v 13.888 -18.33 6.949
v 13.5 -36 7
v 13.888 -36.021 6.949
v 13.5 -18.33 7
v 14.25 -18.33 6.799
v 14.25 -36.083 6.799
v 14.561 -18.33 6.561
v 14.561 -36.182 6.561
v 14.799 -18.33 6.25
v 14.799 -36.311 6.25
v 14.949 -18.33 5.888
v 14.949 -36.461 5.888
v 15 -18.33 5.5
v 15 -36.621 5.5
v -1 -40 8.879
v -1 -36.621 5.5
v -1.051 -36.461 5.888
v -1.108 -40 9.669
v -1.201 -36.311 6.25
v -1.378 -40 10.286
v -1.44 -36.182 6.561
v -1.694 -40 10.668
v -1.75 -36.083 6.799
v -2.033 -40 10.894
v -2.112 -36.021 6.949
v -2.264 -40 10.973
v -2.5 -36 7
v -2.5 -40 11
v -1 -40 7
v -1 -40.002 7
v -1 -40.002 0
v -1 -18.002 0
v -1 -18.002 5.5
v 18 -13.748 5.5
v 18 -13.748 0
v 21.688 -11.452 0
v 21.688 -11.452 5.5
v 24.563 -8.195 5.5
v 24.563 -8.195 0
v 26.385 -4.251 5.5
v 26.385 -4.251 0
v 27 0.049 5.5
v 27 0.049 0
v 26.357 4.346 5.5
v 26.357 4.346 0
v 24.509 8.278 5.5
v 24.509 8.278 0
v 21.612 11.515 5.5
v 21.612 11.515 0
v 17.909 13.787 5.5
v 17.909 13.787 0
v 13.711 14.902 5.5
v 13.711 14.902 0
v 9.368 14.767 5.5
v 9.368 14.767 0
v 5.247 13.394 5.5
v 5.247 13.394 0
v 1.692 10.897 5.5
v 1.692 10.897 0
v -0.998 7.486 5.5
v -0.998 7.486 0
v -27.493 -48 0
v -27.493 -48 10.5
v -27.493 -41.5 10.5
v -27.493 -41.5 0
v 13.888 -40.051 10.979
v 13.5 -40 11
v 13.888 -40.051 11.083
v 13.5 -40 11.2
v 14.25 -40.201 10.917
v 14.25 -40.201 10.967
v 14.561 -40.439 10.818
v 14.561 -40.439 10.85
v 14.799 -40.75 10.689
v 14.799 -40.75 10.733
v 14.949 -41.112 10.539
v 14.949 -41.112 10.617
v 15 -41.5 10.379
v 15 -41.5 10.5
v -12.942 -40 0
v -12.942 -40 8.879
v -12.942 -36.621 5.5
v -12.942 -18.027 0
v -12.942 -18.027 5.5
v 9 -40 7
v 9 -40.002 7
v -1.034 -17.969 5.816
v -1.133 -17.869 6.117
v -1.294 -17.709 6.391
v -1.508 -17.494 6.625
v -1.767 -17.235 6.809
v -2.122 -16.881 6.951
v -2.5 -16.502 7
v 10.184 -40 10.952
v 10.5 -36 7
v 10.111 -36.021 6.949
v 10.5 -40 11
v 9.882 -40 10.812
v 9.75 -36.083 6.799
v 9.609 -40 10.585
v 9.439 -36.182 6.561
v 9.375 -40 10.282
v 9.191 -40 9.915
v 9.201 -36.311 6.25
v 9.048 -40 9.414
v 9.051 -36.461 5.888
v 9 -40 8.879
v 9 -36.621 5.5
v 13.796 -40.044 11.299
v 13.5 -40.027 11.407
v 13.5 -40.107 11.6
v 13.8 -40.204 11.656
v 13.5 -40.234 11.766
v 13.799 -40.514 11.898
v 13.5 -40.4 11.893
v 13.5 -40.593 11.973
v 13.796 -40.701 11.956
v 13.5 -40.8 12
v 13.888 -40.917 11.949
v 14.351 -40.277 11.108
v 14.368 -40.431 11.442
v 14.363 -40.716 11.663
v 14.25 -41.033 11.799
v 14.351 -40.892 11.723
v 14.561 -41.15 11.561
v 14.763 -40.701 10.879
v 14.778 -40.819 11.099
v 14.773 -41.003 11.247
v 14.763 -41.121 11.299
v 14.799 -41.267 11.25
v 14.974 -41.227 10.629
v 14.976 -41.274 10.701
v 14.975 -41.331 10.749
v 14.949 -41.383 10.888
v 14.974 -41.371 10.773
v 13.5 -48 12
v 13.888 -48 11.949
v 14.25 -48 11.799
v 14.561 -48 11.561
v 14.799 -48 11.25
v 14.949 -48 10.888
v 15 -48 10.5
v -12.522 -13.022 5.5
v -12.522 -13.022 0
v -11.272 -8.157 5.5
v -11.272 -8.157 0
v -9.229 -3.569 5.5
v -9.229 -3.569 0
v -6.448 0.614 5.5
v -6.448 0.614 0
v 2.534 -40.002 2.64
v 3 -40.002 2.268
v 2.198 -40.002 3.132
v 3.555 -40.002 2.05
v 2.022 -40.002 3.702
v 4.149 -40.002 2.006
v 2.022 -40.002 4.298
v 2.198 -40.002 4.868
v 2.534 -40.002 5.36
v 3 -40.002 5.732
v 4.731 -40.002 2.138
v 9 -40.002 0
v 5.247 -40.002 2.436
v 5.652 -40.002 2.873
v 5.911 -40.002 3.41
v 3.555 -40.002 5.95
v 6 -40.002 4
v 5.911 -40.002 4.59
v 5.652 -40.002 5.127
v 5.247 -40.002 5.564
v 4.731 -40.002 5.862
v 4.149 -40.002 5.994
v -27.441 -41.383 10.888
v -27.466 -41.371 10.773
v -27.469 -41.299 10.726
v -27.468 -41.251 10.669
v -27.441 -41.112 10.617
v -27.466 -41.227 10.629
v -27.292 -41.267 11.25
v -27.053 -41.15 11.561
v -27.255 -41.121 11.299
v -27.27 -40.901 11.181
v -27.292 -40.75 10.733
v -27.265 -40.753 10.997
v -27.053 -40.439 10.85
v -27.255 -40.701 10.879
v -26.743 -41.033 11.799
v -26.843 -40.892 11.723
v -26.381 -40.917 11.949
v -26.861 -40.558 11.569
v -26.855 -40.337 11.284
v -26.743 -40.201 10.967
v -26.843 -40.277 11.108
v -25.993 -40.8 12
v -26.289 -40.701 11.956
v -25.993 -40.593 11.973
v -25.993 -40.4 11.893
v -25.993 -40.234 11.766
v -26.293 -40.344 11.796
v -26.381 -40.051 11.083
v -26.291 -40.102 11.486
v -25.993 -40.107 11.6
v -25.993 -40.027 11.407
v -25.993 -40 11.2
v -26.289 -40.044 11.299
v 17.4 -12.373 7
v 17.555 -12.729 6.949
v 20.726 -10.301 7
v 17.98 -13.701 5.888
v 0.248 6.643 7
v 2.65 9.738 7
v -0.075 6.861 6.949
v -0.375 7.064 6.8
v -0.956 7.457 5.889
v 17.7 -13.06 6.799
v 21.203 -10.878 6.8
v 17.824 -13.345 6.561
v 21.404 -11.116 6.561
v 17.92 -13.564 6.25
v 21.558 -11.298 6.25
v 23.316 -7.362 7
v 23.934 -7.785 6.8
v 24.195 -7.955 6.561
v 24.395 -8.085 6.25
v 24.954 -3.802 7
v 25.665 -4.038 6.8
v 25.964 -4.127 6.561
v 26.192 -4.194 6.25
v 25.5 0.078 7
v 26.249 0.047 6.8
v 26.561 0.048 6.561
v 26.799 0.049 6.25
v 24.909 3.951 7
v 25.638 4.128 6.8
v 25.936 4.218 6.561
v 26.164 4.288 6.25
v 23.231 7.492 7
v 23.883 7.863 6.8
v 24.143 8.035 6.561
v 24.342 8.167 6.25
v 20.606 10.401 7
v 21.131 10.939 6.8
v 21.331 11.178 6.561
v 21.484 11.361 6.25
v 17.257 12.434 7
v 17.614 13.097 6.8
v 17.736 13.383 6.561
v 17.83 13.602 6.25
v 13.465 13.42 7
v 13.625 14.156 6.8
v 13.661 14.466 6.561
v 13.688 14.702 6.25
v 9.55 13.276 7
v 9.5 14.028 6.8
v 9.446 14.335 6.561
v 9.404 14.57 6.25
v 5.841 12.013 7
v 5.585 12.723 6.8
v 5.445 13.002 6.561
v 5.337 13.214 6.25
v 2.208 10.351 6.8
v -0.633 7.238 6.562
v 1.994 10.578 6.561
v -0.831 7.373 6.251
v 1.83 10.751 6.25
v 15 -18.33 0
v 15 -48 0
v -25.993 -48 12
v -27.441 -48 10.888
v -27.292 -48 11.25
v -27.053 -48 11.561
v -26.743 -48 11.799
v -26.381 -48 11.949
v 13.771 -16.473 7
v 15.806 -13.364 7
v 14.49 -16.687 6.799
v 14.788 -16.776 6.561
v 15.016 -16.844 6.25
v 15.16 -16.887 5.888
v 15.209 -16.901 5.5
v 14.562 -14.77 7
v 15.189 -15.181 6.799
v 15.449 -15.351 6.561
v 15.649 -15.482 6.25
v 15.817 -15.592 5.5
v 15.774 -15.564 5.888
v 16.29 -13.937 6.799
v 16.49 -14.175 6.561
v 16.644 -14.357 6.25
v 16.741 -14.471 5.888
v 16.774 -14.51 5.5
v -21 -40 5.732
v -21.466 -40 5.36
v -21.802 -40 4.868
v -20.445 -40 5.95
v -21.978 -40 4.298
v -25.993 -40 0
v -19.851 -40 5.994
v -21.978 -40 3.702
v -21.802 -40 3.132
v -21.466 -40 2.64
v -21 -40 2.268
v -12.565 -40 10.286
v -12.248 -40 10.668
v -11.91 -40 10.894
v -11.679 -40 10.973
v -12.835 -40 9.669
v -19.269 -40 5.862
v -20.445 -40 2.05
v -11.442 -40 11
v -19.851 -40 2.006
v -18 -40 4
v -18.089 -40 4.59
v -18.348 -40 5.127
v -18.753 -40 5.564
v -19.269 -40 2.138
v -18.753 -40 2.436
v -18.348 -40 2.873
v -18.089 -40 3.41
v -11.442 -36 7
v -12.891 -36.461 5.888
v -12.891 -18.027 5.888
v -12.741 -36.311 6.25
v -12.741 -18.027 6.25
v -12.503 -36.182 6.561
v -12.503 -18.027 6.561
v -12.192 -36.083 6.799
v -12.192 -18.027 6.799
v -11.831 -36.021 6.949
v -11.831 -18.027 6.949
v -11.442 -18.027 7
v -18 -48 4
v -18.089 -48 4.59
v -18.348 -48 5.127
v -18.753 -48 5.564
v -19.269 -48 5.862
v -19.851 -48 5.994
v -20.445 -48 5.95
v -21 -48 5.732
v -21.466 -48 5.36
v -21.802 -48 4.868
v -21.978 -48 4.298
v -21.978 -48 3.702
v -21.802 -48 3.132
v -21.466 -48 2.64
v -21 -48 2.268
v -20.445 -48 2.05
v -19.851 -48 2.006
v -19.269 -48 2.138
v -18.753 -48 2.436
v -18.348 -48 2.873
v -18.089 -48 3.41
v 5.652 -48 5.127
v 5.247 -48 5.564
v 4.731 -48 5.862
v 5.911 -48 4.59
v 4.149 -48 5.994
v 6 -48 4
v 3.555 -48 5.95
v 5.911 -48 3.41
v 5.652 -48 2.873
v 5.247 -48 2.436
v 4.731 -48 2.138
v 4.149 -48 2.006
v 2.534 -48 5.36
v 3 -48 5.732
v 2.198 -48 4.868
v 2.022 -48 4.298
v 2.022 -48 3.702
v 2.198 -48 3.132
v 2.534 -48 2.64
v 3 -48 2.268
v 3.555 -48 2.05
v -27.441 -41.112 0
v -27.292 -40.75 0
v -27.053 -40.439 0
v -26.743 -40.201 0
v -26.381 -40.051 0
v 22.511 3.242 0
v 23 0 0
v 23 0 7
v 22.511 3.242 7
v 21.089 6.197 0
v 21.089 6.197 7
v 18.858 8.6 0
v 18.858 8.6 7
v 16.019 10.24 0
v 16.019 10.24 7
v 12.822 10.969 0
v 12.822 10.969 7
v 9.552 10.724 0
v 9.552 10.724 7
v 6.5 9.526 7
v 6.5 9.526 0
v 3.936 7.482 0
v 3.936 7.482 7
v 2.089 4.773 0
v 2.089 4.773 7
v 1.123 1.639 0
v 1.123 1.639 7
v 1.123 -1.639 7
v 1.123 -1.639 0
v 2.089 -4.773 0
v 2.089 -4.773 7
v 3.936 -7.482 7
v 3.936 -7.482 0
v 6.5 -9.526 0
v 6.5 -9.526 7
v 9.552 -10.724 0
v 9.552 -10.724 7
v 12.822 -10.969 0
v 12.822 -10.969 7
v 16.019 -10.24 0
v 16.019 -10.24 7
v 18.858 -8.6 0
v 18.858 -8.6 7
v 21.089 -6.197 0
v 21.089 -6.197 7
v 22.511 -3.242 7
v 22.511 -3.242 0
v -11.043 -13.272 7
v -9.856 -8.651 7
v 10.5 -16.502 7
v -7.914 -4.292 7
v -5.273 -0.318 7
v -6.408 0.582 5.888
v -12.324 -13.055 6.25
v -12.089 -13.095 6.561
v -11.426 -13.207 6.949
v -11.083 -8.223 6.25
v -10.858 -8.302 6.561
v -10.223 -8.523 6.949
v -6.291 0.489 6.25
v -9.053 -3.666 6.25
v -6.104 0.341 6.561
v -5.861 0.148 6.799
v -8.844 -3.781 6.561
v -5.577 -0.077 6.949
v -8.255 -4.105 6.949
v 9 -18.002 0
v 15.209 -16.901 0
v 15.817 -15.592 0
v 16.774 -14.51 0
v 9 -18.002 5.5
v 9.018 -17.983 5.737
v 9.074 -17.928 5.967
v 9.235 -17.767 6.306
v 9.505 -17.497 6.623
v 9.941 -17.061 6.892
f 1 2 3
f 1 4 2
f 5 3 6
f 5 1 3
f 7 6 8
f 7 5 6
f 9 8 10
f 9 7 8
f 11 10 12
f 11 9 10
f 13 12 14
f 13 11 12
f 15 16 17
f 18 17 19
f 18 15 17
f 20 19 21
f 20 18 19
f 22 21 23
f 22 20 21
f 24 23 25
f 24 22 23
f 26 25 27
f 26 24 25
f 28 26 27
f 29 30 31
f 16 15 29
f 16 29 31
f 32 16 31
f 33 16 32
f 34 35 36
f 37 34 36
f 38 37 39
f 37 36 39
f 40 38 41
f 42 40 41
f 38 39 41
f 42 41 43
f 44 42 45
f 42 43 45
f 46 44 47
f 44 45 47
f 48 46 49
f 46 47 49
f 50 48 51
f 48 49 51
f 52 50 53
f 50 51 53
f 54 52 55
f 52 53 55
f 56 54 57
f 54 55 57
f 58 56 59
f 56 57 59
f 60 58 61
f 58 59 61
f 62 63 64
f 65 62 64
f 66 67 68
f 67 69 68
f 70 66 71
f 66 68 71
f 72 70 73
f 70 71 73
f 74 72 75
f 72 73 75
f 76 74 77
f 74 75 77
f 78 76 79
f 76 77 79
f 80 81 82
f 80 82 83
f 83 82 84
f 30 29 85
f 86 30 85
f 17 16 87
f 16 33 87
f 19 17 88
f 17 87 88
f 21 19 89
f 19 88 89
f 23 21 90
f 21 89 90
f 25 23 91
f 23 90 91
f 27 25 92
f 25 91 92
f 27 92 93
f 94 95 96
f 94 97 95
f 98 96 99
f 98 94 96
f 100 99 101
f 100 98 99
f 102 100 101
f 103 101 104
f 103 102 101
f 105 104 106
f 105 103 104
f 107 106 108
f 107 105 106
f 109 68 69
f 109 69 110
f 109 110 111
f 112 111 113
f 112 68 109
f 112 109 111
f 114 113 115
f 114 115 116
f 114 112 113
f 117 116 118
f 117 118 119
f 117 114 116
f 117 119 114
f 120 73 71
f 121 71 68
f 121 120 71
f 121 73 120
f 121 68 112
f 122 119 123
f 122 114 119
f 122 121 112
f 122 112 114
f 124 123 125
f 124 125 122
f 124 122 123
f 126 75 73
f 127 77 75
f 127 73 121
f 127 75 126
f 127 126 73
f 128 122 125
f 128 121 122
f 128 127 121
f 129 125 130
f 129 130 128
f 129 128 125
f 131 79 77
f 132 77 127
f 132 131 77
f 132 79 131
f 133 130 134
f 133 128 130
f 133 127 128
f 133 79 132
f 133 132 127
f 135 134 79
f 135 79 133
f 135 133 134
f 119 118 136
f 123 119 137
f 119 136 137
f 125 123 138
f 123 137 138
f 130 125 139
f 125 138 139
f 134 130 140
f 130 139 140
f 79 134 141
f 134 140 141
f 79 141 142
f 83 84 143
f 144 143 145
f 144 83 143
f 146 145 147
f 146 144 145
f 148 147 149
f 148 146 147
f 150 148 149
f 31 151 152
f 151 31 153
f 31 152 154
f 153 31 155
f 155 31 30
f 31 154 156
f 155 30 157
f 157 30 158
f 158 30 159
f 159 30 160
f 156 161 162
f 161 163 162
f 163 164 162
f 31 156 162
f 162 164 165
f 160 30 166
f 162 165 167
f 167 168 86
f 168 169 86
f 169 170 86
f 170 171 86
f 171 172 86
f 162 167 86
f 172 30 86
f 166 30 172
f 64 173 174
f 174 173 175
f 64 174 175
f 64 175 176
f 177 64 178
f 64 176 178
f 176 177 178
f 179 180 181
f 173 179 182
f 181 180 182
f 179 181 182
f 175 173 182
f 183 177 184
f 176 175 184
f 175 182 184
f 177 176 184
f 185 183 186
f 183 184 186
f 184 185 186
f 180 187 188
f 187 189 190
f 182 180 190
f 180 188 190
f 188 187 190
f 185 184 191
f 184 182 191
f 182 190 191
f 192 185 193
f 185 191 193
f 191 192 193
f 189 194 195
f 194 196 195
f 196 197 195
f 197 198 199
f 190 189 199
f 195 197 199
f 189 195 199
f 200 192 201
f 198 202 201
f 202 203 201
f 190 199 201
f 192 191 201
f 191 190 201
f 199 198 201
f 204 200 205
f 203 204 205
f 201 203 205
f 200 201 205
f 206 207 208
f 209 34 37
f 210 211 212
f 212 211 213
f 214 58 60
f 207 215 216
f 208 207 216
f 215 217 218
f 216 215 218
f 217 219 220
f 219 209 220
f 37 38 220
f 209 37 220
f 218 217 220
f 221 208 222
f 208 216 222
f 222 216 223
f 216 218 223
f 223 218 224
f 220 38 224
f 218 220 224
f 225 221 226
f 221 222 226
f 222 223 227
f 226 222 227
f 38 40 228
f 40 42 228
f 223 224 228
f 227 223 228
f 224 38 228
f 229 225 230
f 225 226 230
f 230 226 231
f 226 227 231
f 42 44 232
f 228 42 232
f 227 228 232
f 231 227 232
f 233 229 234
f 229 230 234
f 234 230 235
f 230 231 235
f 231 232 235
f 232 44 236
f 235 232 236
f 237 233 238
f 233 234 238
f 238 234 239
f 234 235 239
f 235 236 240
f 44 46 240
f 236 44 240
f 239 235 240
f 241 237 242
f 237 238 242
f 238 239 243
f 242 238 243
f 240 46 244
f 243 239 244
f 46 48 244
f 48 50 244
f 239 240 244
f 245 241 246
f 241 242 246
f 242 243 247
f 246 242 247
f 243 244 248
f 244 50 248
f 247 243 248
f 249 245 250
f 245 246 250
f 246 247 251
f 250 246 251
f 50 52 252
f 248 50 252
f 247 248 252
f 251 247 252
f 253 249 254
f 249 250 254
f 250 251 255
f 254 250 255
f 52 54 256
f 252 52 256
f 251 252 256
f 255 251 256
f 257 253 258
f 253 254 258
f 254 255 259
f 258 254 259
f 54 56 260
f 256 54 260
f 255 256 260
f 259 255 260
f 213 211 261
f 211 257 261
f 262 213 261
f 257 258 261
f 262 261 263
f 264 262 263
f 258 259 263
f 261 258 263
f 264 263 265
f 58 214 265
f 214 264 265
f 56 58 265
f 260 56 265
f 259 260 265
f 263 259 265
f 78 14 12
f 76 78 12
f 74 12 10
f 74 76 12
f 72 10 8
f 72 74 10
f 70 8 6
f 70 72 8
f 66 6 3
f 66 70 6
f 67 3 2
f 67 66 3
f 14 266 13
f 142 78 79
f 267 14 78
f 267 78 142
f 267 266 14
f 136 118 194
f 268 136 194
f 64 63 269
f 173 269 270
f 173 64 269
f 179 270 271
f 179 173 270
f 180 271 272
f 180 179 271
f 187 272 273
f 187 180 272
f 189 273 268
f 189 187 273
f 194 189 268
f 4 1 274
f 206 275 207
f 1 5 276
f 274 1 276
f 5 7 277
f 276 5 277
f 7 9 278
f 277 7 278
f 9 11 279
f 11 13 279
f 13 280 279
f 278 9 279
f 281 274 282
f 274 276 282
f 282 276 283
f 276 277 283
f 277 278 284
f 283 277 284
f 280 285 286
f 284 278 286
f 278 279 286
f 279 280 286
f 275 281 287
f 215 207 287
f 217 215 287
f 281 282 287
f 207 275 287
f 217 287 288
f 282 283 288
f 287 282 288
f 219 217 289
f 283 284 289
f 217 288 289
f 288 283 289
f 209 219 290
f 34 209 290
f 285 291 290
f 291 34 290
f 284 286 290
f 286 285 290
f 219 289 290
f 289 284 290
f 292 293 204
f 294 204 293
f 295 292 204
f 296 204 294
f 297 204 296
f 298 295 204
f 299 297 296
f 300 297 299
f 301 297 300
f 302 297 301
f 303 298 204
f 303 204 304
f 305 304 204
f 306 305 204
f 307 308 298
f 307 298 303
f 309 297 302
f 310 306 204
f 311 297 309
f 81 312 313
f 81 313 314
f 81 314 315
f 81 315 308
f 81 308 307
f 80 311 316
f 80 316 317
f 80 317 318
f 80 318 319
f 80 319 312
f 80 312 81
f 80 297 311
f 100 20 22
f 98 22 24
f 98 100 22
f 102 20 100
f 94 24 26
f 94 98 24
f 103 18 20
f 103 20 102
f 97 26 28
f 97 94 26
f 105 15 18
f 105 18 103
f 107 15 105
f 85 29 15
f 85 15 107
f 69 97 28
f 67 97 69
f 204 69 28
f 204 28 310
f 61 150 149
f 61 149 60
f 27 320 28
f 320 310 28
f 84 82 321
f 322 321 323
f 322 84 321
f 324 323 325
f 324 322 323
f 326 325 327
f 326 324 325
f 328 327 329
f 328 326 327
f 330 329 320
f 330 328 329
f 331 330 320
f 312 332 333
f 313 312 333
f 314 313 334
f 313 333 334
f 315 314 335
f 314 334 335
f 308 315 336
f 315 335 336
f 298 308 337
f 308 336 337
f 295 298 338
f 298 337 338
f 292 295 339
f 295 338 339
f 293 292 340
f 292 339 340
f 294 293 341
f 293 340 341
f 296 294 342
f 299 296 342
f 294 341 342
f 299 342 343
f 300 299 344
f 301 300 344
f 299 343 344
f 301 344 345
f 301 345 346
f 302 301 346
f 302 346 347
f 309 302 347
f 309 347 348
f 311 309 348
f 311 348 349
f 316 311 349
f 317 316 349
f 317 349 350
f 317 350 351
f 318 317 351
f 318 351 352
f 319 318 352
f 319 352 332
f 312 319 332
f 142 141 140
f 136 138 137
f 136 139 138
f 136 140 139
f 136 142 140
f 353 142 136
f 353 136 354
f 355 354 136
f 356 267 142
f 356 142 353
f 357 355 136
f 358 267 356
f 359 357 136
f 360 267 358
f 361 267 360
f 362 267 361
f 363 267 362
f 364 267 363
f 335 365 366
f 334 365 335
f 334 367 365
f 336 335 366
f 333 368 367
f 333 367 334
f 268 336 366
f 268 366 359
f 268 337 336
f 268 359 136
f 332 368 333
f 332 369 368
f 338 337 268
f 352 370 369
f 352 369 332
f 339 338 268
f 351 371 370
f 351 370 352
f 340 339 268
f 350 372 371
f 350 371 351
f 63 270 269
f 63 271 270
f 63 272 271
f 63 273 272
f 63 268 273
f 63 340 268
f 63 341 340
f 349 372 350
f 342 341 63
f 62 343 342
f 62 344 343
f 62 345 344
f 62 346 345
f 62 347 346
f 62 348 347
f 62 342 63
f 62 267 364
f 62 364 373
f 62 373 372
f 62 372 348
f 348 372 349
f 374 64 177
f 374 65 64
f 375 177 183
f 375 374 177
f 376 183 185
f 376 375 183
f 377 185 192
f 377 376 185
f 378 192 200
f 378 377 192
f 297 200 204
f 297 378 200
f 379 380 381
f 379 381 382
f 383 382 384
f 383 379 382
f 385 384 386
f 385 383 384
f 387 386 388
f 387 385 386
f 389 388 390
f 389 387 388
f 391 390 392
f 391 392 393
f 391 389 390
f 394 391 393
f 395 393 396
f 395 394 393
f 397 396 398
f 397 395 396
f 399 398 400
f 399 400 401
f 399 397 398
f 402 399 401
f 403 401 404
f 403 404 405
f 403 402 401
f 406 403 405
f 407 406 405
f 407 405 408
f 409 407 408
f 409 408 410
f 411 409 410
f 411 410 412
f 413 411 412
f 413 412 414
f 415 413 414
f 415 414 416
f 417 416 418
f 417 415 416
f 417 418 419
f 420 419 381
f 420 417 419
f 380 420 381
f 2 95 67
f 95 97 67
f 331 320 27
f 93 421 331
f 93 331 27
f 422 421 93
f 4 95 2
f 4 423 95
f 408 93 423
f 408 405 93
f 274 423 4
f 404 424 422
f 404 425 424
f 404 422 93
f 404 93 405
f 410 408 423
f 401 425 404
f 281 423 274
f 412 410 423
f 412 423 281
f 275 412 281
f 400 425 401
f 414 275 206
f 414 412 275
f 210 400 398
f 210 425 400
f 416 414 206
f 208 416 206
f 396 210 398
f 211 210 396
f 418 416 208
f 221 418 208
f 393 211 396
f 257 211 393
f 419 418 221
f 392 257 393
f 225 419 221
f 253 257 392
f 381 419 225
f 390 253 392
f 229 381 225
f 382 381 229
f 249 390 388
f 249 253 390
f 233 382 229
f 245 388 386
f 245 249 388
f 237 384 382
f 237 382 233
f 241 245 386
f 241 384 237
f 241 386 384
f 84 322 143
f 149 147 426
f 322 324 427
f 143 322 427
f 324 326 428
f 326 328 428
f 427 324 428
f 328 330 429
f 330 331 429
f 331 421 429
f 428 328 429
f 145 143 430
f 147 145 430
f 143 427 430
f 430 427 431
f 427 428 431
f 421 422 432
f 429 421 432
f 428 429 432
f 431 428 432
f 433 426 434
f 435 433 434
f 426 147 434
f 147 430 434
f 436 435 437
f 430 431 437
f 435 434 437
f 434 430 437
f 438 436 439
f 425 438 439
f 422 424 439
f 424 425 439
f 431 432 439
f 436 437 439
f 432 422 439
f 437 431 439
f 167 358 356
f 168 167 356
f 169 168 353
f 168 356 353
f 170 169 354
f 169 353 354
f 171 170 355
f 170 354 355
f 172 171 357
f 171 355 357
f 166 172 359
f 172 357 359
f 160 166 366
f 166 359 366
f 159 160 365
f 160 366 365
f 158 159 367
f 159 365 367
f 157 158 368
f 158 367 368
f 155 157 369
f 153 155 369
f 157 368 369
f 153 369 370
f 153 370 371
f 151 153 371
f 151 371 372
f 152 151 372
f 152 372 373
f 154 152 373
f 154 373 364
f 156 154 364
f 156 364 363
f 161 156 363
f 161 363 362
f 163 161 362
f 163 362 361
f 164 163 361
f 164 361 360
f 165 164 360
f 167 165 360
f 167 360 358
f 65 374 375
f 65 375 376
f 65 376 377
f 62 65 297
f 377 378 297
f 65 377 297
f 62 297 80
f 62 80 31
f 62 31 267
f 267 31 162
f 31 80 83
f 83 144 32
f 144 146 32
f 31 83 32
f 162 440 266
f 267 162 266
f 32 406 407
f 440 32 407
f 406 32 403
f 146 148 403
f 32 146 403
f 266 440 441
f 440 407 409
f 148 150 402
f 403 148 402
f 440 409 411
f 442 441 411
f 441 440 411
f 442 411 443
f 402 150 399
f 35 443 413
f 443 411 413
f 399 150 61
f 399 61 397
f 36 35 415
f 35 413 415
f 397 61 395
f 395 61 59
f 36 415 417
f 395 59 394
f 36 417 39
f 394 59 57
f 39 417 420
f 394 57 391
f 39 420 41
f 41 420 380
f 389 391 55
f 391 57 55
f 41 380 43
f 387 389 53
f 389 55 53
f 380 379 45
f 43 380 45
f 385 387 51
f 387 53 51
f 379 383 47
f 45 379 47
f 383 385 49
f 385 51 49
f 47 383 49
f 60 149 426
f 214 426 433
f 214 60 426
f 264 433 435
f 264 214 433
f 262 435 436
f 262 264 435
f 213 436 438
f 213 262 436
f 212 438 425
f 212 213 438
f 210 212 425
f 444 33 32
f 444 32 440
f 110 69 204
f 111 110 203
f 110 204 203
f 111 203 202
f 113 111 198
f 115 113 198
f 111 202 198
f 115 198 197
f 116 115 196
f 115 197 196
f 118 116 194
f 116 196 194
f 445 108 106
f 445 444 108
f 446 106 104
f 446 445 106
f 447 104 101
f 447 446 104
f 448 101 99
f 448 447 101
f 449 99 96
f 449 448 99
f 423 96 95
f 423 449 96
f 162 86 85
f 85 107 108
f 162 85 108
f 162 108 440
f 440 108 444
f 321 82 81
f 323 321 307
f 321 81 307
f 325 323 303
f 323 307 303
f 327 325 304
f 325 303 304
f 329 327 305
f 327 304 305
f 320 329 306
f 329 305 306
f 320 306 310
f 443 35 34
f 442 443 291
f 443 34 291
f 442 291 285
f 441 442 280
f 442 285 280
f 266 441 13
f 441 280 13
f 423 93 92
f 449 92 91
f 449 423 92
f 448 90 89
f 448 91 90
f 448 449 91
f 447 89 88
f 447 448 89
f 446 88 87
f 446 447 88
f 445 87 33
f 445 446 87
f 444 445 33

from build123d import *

# Parameters (mm, degrees)
SKETCH_R        = 11
PAD_DEPTH       = 7
PAD001_DEPTH    = 5
SKETCH002_R     = 2
POCKET_DEPTH    = 9
POCKET002_DEPTH = 20
FILLET_R        = 30
FILLET001_R     = 5
SKETCH005_W     = 10
SKETCH005_H     = 22
POCKET003_DEPTH = 15
CHAMFER_SIZE    = 4
FILLET002_R     = 0.8
FILLET003_R     = 1.5
FILLET004_R     = 1.5
FILLET005_R     = 1.5


with BuildPart() as part:
    # Sketch → Pad (new body)
    with BuildSketch(Plane.XY):
        with BuildLine():
            Line((-15, -48), (15, -48))
            Line((15, -48), (15, -14.696938))
            ThreePointArc((15, -14.696938), (24.166051, 8.774235), (-0.998465, 7.48598))
            Line((-45, -48), (-0.998465, 7.48598))
            Line((-45, -48), (-15, -48))
        make_face()
        with Locations((12, 0)):
            Circle(SKETCH_R, mode=Mode.SUBTRACT)
    extrude(amount=PAD_DEPTH)

    # Sketch001 (on Face6 of Pad) → Pad001 (join)
    with BuildSketch(Plane.XY.offset(7)):
        Polygon((-45, -48), (-40.385913, -40), (15, -40), (15, -48), align=None)
    extrude(amount=PAD001_DEPTH)

    # Sketch002 (on Face11 of Pad001) → Pocket (cut)
    with BuildSketch(Plane.XZ.offset(48)):
        with Locations((-20, 4)):
            Circle(SKETCH002_R)
        with Locations((4, 4)):
            Circle(SKETCH002_R)
    extrude(amount=-POCKET_DEPTH, mode=Mode.SUBTRACT)

    # Sketch004 → Pocket002 (cut)
    with BuildSketch(Plane.XY.offset(12)):
        Polygon((-27.492516, -50.55183), (-27.492516, -40), (-12.942459, -40), (-12.942459, 0), (-27.492525, 0), (-27.492525, 11.934225), (-46.836239, 11.934225), (-46.836239, -50.55183), align=None)
    extrude(amount=-POCKET002_DEPTH, mode=Mode.SUBTRACT)

    # Fillet
    fillet_edges = [part.edges().sort_by_distance(p)[0] for p in [
        (-12.942459, -7.575408, 3.5),
    ]]
    fillet(fillet_edges, radius=FILLET_R)

    # Fillet001
    fillet001_edges = [part.edges().sort_by_distance(p)[0] for p in [
        (15, -14.696938, 3.5),
    ]]
    fillet(fillet001_edges, radius=FILLET001_R)

    # Sketch005 (on Face12 of Fillet001) → Pocket003 (cut)
    with BuildSketch(Plane.XY.offset(7)):
        with Locations((3.99969, -29.002266)):
            Rectangle(SKETCH005_W, SKETCH005_H)
    extrude(amount=-POCKET003_DEPTH, mode=Mode.SUBTRACT)

    # Chamfer
    chamfer_edges = [part.edges().sort_by_distance(p)[0] for p in [
        (-6.971384, -40, 7),
        (11.999845, -40, 7),
    ]]
    chamfer(chamfer_edges, length=CHAMFER_SIZE)

    # Fillet002
    fillet002_edges = [part.edges().sort_by_distance(p)[0] for p in [
        (-6.246258, -40, 12),
    ]]
    fillet(fillet002_edges, radius=FILLET002_R)

    # Fillet003
    fillet003_edges = [part.edges().sort_by_distance(p)[0] for p in [
        (-27.492516, -44.4, 12),
        (-27.492516, -40.234315, 11.765685),
        (-27.492516, -40, 5.6),
    ]]
    fillet(fillet003_edges, radius=FILLET003_R)

    # Fillet004
    fillet004_edges = [part.edges().sort_by_distance(p)[0] for p in [
        (-12.942459, -38, 9),
        (-12.942459, -27.01348, 7),
        (-11.272446, -8.157216, 7),
        (-3.7234, 4.049834, 7),
        (23.17865, 10.001889, 7),
        (15.8167, -15.59169, 7),
        (15, -27.165151, 7),
        (15, -38, 9),
        (15, -40, 11.1),
        (15, -40.234315, 11.765685),
        (15, -44.4, 12),
    ]]
    fillet(fillet004_edges, radius=FILLET004_R)

    # Fillet005
    fillet005_edges = [part.edges().sort_by_distance(p)[0] for p in [
        (-1.00031, -38, 9),
        (-1.00031, -27.001133, 7),
        (3.99969, -18.002266, 7),
        (8.99969, -27.001133, 7),
        (8.99969, -38, 9),
    ]]
    fillet(fillet005_edges, radius=FILLET005_R)


solid = part.part
